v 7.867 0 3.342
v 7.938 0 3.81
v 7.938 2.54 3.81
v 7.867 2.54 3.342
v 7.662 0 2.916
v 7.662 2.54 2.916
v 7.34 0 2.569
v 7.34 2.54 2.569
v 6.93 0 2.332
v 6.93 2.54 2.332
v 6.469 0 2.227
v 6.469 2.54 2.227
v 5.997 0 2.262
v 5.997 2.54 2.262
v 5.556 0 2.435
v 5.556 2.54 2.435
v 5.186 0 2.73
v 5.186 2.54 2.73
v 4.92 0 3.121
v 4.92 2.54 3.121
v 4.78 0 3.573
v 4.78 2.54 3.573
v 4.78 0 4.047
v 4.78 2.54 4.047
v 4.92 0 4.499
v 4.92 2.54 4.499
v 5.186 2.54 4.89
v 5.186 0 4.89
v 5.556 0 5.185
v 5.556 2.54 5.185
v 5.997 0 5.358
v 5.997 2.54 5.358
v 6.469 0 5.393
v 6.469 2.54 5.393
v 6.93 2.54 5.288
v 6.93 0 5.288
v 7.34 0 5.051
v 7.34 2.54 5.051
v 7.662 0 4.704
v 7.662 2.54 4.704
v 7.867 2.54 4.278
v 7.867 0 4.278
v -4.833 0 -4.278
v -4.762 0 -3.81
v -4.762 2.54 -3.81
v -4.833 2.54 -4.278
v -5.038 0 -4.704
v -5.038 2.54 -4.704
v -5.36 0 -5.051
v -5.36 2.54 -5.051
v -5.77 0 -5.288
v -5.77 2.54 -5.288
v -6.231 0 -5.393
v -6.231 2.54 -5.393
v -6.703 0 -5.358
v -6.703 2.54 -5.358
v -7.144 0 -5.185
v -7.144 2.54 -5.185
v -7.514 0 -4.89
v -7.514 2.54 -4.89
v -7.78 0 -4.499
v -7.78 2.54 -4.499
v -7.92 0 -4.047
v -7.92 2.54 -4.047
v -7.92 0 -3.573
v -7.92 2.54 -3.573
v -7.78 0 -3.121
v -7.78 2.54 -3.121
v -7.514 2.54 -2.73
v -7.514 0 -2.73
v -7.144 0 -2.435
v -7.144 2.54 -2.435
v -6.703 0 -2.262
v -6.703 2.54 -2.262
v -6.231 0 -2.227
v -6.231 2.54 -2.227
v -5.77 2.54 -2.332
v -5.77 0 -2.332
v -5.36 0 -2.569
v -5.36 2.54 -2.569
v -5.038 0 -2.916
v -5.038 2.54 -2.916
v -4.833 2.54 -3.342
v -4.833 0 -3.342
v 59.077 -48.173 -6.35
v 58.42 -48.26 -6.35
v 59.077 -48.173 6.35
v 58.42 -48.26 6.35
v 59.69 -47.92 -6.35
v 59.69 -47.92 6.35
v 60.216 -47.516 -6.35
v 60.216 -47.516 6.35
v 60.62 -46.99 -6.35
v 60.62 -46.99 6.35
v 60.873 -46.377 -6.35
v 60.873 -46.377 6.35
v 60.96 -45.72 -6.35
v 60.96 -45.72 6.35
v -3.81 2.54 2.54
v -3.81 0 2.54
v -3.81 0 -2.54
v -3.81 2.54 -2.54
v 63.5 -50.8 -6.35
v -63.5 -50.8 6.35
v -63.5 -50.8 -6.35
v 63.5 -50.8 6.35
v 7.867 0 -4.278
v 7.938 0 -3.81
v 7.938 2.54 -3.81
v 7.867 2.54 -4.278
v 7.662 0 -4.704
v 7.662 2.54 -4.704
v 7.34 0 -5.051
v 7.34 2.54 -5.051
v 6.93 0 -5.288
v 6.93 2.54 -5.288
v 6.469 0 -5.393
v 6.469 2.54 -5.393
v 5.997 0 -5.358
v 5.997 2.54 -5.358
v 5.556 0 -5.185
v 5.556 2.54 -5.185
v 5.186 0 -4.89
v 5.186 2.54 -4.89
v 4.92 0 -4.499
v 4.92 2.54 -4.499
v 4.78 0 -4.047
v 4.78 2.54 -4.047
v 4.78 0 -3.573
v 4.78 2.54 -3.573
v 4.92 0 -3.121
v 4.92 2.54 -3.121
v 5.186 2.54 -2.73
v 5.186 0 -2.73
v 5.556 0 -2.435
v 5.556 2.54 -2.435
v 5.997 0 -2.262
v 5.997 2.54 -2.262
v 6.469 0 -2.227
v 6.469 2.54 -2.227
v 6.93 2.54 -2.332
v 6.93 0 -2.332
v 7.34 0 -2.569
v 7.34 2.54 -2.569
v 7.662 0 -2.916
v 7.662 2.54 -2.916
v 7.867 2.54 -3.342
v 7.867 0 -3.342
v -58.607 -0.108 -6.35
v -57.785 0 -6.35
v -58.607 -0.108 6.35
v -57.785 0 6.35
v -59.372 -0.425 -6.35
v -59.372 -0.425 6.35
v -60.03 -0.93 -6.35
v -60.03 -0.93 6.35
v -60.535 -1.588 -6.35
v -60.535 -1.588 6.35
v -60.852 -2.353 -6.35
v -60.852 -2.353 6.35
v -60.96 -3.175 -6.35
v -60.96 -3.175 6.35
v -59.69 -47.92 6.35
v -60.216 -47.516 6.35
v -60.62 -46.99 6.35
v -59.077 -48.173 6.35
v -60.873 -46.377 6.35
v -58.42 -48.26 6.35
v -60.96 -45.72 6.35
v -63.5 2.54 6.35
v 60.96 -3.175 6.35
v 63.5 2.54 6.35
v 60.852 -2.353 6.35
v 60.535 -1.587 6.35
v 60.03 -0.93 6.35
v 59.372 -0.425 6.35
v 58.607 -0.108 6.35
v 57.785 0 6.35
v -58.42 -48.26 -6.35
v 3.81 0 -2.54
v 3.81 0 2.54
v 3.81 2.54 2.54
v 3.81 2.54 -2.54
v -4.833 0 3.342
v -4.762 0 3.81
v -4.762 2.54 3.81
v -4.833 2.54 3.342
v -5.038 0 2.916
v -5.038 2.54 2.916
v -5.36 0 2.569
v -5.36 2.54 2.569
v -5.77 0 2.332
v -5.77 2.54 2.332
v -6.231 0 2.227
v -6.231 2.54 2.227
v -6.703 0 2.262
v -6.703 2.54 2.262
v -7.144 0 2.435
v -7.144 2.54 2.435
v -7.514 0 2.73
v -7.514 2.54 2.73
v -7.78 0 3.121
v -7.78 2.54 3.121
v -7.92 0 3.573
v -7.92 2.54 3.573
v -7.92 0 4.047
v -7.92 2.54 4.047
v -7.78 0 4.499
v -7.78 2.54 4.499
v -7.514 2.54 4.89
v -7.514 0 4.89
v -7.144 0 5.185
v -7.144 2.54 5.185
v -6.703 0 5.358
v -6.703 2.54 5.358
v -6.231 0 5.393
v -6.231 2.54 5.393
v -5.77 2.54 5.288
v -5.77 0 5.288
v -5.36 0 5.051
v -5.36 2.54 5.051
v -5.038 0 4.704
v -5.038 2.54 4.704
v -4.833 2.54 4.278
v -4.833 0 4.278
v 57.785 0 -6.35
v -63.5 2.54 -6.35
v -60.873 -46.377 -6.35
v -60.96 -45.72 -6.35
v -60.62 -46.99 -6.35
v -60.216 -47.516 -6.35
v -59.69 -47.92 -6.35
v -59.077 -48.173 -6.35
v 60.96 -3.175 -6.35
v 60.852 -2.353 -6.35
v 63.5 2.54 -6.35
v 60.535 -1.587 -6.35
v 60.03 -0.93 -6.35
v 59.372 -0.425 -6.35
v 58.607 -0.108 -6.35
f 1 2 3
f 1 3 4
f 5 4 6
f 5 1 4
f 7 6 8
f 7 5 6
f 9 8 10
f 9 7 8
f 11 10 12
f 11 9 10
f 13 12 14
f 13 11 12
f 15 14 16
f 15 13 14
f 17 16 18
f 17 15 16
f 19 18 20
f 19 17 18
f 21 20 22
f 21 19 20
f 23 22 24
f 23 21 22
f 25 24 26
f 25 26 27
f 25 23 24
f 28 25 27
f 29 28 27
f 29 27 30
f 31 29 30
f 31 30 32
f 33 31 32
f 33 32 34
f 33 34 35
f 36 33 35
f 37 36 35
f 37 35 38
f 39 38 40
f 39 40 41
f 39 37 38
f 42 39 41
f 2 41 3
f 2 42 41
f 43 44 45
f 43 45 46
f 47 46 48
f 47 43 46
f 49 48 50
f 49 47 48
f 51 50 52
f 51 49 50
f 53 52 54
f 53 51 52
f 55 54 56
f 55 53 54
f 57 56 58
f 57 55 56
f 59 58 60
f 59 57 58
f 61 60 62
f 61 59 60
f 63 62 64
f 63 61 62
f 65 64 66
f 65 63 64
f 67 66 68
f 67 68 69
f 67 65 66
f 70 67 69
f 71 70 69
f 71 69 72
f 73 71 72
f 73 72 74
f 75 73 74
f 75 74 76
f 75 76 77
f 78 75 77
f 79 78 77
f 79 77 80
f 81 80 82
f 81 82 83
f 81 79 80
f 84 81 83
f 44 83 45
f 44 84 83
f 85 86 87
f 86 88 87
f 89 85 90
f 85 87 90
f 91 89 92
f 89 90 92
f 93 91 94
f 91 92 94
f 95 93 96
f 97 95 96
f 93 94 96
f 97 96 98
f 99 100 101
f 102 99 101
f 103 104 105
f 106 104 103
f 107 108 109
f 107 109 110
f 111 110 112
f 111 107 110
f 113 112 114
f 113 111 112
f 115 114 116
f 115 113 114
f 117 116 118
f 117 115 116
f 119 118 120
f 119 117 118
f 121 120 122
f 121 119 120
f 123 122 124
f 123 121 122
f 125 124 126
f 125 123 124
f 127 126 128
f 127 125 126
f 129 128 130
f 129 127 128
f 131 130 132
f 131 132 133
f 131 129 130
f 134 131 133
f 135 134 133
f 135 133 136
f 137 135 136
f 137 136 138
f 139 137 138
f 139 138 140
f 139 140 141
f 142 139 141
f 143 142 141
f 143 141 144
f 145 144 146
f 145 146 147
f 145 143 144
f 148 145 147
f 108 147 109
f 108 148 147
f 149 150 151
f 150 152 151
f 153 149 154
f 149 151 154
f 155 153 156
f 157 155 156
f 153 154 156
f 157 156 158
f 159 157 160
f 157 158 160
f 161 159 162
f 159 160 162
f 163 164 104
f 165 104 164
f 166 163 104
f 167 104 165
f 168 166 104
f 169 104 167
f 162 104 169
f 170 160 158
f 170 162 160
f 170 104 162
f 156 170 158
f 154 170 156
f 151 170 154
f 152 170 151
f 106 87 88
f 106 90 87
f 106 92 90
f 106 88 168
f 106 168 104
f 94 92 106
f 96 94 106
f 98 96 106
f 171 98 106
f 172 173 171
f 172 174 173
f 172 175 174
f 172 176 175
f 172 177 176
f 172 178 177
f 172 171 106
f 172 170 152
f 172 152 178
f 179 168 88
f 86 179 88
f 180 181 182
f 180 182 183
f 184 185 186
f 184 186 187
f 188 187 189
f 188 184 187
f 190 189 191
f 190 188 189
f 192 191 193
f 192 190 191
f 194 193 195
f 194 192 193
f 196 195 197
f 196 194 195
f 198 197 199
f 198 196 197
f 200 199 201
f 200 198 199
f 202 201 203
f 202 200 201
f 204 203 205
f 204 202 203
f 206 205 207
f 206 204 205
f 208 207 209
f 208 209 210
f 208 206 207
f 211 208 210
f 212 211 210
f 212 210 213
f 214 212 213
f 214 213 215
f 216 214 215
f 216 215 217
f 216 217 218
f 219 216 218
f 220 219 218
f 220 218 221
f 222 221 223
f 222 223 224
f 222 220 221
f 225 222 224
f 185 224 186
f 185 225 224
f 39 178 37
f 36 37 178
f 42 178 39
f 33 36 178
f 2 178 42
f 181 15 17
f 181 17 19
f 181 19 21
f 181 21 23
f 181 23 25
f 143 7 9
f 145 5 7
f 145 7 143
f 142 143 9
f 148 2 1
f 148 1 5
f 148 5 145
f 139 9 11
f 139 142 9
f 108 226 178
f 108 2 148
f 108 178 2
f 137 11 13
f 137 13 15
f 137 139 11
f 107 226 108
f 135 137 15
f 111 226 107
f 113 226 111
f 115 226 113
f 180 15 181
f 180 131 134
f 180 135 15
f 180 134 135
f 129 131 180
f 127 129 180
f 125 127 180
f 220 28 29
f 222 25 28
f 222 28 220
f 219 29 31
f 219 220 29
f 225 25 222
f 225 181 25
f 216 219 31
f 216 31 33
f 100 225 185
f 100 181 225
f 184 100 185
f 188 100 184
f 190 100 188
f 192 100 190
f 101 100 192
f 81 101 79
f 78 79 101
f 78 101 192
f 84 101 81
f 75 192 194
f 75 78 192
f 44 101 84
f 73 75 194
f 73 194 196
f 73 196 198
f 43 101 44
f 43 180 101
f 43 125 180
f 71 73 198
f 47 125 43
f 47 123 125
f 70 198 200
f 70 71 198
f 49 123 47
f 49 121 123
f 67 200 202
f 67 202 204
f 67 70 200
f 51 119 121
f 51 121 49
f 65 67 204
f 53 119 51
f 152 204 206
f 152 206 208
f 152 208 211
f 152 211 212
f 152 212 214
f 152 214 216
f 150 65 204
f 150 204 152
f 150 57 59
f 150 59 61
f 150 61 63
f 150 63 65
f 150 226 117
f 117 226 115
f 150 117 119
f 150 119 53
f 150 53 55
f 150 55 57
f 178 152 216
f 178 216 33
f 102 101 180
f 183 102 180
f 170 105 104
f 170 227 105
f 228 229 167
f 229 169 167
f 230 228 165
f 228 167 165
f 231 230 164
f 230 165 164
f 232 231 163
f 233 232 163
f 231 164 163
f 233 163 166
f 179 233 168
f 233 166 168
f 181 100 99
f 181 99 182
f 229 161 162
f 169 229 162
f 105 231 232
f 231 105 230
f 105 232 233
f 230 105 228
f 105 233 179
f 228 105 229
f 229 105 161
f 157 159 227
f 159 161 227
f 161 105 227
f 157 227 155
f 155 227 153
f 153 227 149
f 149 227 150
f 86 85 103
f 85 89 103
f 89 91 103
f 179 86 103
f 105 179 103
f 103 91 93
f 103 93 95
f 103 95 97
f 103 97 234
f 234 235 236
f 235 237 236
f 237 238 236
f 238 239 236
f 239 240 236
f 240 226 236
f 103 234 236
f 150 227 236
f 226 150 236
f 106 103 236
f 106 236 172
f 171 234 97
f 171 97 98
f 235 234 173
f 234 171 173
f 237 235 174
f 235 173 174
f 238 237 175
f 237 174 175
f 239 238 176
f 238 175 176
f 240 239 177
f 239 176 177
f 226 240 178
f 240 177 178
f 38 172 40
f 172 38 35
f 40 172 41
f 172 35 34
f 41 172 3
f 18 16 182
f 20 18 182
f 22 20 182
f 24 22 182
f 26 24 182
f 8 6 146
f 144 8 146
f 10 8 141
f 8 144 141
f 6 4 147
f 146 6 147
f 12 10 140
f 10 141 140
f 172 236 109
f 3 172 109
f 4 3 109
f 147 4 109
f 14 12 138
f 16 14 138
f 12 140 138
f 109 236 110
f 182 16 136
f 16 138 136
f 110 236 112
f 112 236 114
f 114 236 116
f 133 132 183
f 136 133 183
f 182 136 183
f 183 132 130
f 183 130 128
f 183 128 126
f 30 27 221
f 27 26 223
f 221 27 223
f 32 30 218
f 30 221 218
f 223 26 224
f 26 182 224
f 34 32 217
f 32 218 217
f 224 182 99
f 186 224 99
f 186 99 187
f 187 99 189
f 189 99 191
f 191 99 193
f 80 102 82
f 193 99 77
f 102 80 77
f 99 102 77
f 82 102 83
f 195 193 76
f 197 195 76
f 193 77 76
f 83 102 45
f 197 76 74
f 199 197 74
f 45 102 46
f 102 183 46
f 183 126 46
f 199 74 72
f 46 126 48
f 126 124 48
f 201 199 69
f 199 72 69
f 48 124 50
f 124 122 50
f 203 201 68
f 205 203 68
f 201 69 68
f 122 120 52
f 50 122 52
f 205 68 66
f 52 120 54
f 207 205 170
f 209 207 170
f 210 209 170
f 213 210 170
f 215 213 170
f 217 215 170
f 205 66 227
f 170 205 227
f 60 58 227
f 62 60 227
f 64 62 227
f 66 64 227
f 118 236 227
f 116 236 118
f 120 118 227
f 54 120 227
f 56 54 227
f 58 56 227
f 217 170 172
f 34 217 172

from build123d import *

# Parameters (mm, degrees)
SKETCH1_R           = 1.5875
SKETCH1_W           = 7.62
SKETCH1_H           = 5.08
BOSS_EXTRUDE1_DEPTH = 2.54
SKETCH2_W           = 2.54
SKETCH2_H           = 12.7
BOSS_EXTRUDE2_DEPTH = 50.8
SKETCH3_W           = 127
SKETCH3_H           = 12.7
BOSS_EXTRUDE3_DEPTH = 2.54
FILLET1_R           = 2.54
FILLET2_R           = 3.175


with BuildPart() as part:
    # Sketch1 → Boss-Extrude1 (new body)
    with BuildSketch(Plane(origin=(0, 0, 0), x_dir=(1, 0, 0), z_dir=(0, 1, 0))):
        Polygon((-63.5, 6.35), (-12.7, 6.35), (12.7, 6.35), (63.5, 6.35), (63.5, -6.35), (12.7, -6.35), (-12.7, -6.35), (-63.5, -6.35), align=None)
        with Locations((-6.35, 3.81)):
            Circle(SKETCH1_R, mode=Mode.SUBTRACT)
        with Locations((6.35, 3.81)):
            Circle(SKETCH1_R, mode=Mode.SUBTRACT)
        with Locations((6.35, -3.81)):
            Circle(SKETCH1_R, mode=Mode.SUBTRACT)
        with Locations((-6.35, -3.81)):
            Circle(SKETCH1_R, mode=Mode.SUBTRACT)
        Rectangle(SKETCH1_W, SKETCH1_H, mode=Mode.SUBTRACT)
    extrude(amount=BOSS_EXTRUDE1_DEPTH)

    # Sketch2 → Boss-Extrude2 (add)
    with BuildSketch(Plane.XZ):
        with Locations((-62.23, 0)):
            Rectangle(SKETCH2_W, SKETCH2_H)
        with Locations((62.23, 0)):
            Rectangle(SKETCH2_W, SKETCH2_H)
    extrude(amount=BOSS_EXTRUDE2_DEPTH)

    # Sketch3 → Boss-Extrude3 (add)
    with BuildSketch(Plane.XZ.offset(50.8)):
        Rectangle(SKETCH3_W, SKETCH3_H)
    extrude(amount=-BOSS_EXTRUDE3_DEPTH)

    # Fillet1
    fillet1_edges = [part.edges().sort_by_distance(p)[0] for p in [
        (-60.96, -48.26, 0),
        (60.96, -48.26, 0),
    ]]
    fillet(fillet1_edges, radius=FILLET1_R)

    # Fillet2
    fillet2_edges = [part.edges().sort_by_distance(p)[0] for p in [
        (-60.96, 0, 0),
        (60.96, 0, 0),
    ]]
    fillet(fillet2_edges, radius=FILLET2_R)


solid = part.part
